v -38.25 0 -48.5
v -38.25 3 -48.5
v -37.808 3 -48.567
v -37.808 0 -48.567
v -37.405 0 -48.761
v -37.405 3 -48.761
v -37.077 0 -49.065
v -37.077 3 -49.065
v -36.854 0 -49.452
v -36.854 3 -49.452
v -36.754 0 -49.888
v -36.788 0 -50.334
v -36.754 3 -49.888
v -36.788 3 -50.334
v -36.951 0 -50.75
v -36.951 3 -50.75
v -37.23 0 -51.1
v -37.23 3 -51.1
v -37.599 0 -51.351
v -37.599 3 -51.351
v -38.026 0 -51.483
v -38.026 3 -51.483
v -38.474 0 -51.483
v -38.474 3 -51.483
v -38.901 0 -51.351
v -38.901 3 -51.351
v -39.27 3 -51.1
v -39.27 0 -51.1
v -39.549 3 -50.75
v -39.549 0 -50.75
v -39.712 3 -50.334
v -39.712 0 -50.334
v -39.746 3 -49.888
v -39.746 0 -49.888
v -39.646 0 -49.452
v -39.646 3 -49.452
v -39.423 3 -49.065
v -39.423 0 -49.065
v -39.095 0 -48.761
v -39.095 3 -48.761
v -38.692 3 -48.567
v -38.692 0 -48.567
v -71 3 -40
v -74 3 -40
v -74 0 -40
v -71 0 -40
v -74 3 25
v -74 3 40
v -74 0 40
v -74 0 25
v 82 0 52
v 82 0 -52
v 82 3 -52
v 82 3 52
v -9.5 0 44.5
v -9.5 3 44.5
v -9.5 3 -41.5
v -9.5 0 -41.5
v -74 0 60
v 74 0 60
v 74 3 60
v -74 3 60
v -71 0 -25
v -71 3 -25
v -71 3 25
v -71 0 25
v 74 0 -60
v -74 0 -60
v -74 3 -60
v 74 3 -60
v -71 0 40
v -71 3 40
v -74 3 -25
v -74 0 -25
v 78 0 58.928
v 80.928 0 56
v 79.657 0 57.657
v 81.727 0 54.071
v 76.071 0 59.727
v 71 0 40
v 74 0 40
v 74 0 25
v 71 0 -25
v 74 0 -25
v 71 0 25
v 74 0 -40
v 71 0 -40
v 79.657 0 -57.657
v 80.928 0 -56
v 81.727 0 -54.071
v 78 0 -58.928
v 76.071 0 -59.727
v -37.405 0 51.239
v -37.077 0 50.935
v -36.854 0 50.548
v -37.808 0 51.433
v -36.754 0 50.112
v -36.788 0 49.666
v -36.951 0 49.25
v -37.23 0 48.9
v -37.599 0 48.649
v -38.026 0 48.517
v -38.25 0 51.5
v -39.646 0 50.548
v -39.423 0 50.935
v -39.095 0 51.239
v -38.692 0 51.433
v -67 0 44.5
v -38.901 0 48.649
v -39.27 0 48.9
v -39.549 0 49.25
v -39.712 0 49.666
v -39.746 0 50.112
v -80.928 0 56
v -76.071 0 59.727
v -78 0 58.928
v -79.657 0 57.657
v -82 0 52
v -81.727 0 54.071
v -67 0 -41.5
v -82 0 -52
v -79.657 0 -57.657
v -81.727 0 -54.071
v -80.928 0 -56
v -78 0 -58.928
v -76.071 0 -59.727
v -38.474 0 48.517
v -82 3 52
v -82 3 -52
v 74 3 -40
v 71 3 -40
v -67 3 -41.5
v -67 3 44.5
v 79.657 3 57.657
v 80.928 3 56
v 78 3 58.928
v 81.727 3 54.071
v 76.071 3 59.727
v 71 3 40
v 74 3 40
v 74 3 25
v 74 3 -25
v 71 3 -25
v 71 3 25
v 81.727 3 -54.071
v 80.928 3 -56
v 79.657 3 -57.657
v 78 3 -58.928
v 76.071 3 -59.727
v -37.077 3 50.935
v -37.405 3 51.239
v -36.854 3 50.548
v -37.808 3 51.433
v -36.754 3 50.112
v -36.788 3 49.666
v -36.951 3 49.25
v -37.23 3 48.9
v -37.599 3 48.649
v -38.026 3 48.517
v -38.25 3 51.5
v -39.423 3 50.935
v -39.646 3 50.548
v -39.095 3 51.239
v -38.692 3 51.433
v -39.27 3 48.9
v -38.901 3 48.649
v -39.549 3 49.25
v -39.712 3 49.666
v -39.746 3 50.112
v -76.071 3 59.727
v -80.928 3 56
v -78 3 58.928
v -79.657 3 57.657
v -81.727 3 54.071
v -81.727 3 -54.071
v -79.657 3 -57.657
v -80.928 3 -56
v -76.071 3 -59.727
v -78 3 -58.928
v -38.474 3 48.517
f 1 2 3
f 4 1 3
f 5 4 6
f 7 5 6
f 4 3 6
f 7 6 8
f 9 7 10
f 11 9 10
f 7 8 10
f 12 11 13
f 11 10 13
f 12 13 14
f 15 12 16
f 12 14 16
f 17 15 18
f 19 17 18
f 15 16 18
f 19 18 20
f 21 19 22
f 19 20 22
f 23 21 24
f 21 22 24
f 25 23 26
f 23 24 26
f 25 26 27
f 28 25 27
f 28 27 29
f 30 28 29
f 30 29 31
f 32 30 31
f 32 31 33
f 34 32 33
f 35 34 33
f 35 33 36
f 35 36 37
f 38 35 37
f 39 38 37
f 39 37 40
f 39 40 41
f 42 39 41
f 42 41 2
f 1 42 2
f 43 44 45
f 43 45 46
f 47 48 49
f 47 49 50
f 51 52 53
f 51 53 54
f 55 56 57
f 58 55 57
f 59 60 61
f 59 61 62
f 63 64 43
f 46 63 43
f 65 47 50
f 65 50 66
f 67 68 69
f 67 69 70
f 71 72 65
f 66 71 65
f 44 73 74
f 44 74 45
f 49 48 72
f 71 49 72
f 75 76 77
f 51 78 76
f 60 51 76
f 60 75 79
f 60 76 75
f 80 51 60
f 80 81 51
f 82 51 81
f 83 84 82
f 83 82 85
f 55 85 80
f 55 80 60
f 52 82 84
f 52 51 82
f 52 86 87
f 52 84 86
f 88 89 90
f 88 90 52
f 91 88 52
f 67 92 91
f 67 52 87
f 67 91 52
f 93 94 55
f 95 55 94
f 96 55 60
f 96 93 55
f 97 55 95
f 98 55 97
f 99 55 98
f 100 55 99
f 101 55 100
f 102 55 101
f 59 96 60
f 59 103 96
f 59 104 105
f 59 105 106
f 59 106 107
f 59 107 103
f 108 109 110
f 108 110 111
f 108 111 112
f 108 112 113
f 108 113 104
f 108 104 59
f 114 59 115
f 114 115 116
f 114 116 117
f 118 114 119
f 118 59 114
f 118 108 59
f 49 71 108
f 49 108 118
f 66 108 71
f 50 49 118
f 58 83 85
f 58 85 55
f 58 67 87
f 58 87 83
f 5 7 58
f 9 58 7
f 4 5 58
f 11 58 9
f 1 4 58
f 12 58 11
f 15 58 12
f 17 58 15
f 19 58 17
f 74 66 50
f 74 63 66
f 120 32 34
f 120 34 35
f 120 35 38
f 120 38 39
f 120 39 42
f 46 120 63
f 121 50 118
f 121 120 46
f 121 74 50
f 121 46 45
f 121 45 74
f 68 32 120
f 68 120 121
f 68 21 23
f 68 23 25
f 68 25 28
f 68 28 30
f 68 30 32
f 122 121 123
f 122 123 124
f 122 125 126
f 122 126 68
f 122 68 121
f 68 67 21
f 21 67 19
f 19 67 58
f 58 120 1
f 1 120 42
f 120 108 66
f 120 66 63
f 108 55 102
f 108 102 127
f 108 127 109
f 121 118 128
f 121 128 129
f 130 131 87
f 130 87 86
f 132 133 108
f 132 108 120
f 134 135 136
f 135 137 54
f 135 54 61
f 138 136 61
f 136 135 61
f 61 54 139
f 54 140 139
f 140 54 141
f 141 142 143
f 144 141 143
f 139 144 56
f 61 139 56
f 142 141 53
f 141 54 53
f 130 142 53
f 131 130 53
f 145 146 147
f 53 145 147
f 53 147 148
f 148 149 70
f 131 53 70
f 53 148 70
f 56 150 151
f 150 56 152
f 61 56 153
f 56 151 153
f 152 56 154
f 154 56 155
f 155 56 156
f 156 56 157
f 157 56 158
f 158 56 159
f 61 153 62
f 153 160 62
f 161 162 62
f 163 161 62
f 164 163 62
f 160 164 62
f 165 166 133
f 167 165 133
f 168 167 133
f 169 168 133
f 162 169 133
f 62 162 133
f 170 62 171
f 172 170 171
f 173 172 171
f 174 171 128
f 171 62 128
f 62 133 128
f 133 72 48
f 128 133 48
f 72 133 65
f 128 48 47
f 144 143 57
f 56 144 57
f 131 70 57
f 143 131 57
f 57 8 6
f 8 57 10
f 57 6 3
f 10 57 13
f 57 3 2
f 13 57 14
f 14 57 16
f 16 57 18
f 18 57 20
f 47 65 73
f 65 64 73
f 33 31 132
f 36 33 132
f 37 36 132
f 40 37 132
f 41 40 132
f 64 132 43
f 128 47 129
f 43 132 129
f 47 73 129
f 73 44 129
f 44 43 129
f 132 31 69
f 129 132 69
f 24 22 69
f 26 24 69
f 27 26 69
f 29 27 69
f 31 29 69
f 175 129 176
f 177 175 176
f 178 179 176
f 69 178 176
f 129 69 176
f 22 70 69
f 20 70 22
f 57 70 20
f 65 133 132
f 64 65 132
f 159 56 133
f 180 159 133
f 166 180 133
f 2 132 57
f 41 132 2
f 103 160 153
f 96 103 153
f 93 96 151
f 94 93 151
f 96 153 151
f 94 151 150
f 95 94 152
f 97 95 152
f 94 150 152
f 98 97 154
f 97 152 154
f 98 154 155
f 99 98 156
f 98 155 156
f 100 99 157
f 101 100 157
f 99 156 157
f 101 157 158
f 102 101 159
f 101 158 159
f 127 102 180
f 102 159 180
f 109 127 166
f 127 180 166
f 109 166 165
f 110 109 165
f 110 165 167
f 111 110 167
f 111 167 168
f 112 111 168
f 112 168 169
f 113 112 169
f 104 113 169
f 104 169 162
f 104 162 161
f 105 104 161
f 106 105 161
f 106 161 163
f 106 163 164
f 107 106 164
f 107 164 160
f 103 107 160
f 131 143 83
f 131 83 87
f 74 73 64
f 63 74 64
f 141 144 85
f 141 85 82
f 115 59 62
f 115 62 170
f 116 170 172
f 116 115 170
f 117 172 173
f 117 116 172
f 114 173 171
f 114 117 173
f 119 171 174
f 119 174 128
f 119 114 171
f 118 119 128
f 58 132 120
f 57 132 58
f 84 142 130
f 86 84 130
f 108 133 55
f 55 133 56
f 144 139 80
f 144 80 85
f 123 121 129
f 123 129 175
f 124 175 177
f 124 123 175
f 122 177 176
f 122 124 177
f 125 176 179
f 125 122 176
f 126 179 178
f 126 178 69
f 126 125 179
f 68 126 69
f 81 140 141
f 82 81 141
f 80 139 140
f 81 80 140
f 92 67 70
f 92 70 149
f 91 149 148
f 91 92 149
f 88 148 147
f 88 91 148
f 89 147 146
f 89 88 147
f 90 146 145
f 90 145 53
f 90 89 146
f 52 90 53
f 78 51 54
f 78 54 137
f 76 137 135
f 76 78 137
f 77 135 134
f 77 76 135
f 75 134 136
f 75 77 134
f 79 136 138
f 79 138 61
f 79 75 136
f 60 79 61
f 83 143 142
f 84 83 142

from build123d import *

# Parameters (mm, degrees)
BOSS_EXTRUDE1_DEPTH = 3
SKETCH2_R           = 1.5
SKETCH2_W           = 57.5
SKETCH2_H           = 86
CUT_EXTRUDE1_DEPTH  = 102.651364969
SKETCH3_W           = 3
SKETCH3_H           = 15
CUT_EXTRUDE2_DEPTH  = 102.651364969


with BuildPart() as part:
    # Sketch1 → Boss-Extrude1 (new body)
    with BuildSketch(Plane(origin=(0, 0, 0), x_dir=(1, 0, 0), z_dir=(0, 1, 0))):
        with BuildLine():
            Line((-74, 60), (74, 60))
            ThreePointArc((74, 60), (79.656854249, 57.656854249), (82, 52))
            Line((82, 52), (82, -52))
            ThreePointArc((82, -52), (79.656854249, -57.656854249), (74, -60))
            Line((74, -60), (-74, -60))
            ThreePointArc((-74, -60), (-79.656854249, -57.656854249), (-82, -52))
            Line((-82, -52), (-82, 52))
            ThreePointArc((-82, 52), (-79.656854249, 57.656854249), (-74, 60))
        make_face()
    extrude(amount=BOSS_EXTRUDE1_DEPTH)

    # Sketch2 → Cut-Extrude1 (cut, through all)
    with BuildSketch(Plane(origin=(0, 3, 0), x_dir=(1, 0, 0), z_dir=(0, 1, 0))):
        with Locations(Location((-38.25, 50, 0), (0, 0, 270))):
            Circle(SKETCH2_R)
        with Locations(Location((-38.25, -50, 0), (0, 0, 270))):
            Circle(SKETCH2_R)
        with Locations((-38.25, -1.5)):
            Rectangle(SKETCH2_W, SKETCH2_H)
    extrude(amount=-CUT_EXTRUDE1_DEPTH, mode=Mode.SUBTRACT)

    # Sketch3 → Cut-Extrude2 (cut, through all)
    with BuildSketch(Plane(origin=(0, 3, 0), x_dir=(1, 0, 0), z_dir=(0, 1, 0))):
        with Locations((-72.5, 32.5)):
            Rectangle(SKETCH3_W, SKETCH3_H)
        with Locations((-72.5, -32.5)):
            Rectangle(SKETCH3_W, SKETCH3_H)
        with Locations((72.5, -32.5)):
            Rectangle(SKETCH3_W, SKETCH3_H)
        with Locations((72.5, 32.5)):
            Rectangle(SKETCH3_W, SKETCH3_H)
    extrude(amount=-CUT_EXTRUDE2_DEPTH, mode=Mode.SUBTRACT)


solid = part.part
